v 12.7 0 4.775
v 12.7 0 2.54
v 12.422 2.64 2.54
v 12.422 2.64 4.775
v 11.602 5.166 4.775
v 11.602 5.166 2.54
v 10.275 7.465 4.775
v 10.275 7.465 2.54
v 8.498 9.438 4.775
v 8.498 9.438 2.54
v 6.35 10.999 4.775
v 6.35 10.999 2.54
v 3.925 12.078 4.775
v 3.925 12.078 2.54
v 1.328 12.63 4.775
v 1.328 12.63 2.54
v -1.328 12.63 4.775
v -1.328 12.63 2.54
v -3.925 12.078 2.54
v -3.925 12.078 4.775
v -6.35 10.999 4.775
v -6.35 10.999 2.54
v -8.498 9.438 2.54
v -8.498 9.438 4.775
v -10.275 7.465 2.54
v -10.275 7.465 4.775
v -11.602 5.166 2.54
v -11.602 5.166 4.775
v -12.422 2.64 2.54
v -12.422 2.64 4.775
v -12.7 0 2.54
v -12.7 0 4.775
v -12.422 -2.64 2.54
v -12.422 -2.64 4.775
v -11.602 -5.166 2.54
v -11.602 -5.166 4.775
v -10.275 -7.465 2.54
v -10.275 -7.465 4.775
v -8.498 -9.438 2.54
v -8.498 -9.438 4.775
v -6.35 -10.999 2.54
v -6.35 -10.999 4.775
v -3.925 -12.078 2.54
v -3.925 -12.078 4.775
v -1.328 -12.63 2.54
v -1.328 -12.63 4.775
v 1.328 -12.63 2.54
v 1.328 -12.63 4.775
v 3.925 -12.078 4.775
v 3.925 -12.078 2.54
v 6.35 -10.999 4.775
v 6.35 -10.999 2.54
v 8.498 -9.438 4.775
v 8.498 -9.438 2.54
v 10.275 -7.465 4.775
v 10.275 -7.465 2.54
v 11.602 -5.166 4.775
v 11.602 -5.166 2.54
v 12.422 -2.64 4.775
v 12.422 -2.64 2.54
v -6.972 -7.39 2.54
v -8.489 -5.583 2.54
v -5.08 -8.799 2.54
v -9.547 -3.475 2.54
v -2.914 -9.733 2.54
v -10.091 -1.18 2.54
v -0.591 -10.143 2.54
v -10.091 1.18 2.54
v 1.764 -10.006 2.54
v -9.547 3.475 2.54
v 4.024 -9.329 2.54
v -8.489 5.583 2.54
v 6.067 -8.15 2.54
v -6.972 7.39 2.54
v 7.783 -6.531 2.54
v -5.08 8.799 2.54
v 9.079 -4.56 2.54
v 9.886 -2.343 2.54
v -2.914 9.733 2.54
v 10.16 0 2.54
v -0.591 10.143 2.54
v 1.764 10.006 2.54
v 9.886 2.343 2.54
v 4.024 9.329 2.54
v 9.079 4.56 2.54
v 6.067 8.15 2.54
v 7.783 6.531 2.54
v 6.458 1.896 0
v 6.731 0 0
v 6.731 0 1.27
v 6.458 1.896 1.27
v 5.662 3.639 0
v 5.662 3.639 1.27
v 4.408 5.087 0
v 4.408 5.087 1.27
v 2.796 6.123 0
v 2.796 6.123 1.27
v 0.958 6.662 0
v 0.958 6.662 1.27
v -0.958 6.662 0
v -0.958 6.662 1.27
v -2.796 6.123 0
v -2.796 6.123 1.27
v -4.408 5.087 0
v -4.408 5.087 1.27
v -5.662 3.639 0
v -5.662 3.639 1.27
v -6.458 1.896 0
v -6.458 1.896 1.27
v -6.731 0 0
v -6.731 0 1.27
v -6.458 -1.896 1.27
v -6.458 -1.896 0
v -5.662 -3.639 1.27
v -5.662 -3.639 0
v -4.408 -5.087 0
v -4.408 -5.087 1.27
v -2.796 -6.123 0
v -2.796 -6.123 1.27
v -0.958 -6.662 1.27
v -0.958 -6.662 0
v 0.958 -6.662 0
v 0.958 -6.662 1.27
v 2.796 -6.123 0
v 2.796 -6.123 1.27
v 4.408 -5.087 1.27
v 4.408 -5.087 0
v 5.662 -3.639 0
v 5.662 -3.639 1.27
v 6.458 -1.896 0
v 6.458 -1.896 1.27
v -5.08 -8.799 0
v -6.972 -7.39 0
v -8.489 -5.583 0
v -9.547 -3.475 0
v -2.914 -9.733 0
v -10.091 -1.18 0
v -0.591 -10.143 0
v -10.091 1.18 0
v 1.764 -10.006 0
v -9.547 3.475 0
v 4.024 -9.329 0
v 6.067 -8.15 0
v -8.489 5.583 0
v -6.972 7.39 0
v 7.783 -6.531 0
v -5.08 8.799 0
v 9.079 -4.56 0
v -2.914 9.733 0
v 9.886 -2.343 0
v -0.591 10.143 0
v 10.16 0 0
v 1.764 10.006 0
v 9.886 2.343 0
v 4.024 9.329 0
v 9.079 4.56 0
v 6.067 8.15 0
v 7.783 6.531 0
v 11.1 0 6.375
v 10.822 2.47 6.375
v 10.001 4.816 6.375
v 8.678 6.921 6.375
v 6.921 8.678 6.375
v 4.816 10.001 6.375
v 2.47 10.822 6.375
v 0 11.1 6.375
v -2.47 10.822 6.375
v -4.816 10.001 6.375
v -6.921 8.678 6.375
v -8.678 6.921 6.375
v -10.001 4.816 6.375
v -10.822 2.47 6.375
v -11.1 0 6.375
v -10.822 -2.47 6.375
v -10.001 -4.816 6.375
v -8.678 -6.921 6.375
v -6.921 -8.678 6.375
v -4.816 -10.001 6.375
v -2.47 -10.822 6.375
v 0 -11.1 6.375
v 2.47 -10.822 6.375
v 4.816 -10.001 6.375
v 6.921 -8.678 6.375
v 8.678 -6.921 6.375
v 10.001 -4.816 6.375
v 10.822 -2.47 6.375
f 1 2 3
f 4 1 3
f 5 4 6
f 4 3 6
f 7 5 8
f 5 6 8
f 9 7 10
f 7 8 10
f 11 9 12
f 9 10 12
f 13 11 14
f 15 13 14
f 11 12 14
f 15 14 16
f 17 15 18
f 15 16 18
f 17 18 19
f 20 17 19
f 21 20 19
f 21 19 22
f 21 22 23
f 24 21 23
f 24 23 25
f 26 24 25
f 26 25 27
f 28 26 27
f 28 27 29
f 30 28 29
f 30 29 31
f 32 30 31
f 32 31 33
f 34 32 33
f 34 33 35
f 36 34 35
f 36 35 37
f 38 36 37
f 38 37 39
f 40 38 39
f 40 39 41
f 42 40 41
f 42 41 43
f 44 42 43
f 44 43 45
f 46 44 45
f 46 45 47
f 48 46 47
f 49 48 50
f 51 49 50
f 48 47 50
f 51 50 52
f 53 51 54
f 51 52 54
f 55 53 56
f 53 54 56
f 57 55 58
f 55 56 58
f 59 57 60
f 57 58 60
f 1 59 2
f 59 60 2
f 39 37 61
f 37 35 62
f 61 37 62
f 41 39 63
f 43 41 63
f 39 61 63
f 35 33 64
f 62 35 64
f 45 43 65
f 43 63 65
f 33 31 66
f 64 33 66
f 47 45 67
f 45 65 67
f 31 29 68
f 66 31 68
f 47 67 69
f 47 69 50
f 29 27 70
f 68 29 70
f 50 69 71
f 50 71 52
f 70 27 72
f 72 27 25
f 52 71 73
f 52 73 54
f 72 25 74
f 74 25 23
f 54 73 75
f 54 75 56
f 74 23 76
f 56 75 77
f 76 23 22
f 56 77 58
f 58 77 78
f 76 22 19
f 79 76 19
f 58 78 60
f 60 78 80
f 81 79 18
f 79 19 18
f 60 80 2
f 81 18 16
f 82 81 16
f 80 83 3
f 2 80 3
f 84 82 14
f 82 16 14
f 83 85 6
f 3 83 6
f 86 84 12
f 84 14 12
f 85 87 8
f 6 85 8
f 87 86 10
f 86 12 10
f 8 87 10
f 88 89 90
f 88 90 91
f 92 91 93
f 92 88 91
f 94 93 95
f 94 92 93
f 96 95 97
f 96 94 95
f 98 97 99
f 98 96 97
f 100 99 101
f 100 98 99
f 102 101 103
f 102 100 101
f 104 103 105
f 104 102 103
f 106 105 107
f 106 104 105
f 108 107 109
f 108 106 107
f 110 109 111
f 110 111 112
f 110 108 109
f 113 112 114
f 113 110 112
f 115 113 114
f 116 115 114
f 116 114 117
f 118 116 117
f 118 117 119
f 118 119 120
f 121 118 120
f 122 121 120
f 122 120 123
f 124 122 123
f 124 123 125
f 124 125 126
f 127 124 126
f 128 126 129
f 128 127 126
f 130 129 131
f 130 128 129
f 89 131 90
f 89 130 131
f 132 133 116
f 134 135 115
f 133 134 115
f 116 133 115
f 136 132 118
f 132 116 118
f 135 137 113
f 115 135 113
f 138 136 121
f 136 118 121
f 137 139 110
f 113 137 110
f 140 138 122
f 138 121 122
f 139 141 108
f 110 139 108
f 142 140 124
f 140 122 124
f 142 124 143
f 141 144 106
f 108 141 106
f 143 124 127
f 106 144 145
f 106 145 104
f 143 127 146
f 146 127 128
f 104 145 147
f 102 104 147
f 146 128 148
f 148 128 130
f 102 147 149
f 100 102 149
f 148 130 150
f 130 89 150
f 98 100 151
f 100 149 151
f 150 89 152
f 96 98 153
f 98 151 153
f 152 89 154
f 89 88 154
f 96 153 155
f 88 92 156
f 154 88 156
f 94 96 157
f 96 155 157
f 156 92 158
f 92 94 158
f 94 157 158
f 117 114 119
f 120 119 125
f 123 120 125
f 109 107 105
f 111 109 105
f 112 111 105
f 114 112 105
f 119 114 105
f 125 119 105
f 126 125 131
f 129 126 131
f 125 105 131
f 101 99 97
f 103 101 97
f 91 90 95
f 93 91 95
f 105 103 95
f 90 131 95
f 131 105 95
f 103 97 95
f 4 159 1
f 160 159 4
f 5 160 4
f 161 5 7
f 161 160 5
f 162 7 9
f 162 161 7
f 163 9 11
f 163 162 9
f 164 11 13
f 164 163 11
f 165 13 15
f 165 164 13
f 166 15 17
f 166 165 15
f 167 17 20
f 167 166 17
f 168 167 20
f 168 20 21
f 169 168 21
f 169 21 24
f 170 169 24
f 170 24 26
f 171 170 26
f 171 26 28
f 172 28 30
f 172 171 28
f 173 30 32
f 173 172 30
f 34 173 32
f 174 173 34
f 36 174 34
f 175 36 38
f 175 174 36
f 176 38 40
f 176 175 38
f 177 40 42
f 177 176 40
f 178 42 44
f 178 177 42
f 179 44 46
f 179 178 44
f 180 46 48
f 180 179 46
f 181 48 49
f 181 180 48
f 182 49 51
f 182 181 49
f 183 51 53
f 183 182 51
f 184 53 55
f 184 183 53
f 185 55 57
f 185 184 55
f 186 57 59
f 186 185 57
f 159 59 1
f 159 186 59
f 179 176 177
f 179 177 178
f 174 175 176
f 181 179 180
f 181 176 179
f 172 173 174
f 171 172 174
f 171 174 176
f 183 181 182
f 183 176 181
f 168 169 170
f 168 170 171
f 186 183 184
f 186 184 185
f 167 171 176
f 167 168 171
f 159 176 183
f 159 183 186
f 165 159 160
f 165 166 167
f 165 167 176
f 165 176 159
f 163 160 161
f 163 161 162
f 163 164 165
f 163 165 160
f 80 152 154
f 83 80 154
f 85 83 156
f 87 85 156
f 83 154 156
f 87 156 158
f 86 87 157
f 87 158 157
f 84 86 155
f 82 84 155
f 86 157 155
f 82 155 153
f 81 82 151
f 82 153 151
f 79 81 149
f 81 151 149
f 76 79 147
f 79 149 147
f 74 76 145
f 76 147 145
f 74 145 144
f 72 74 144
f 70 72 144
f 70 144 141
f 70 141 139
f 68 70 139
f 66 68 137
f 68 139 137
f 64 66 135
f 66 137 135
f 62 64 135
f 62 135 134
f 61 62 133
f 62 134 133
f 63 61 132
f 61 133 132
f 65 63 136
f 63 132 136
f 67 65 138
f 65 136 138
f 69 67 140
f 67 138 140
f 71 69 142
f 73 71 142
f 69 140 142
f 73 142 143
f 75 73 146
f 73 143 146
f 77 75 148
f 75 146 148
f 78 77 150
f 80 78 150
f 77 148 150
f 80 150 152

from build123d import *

# Parameters (mm, degrees)
F0_R     = 12.7
F0_R_2   = 10.16
F0_R_3   = 6.731
F1_DEPTH = 6.3754
F2_DEPTH = 2.54
F3_DEPTH = 1.27
F4_SIZE  = 1.6002


with BuildPart() as f1:
    # F0 (on Top) → F1 (new body)
    with BuildSketch(Plane.XY):
        Circle(F0_R)
        Circle(F0_R_2, mode=Mode.SUBTRACT)
        Circle(F0_R_2)
        Circle(F0_R_3, mode=Mode.SUBTRACT)
        Circle(F0_R_3)
    extrude(amount=F1_DEPTH)

    # F0 (on Top) → F2 (cut)
    with BuildSketch(Plane.XY):
        Circle(F0_R)
        Circle(F0_R_2, mode=Mode.SUBTRACT)
    extrude(amount=F2_DEPTH, mode=Mode.SUBTRACT)

    # F0 (on Top) → F3 (cut)
    with BuildSketch(Plane.XY):
        Circle(F0_R_3)
    extrude(amount=F3_DEPTH, mode=Mode.SUBTRACT)

    # F4
    f4_edges = [f1.edges().sort_by_distance(p)[0] for p in [
        (-12.7, 0, 6.3754),
    ]]
    chamfer(f4_edges, length=F4_SIZE)


solid = f1.part
